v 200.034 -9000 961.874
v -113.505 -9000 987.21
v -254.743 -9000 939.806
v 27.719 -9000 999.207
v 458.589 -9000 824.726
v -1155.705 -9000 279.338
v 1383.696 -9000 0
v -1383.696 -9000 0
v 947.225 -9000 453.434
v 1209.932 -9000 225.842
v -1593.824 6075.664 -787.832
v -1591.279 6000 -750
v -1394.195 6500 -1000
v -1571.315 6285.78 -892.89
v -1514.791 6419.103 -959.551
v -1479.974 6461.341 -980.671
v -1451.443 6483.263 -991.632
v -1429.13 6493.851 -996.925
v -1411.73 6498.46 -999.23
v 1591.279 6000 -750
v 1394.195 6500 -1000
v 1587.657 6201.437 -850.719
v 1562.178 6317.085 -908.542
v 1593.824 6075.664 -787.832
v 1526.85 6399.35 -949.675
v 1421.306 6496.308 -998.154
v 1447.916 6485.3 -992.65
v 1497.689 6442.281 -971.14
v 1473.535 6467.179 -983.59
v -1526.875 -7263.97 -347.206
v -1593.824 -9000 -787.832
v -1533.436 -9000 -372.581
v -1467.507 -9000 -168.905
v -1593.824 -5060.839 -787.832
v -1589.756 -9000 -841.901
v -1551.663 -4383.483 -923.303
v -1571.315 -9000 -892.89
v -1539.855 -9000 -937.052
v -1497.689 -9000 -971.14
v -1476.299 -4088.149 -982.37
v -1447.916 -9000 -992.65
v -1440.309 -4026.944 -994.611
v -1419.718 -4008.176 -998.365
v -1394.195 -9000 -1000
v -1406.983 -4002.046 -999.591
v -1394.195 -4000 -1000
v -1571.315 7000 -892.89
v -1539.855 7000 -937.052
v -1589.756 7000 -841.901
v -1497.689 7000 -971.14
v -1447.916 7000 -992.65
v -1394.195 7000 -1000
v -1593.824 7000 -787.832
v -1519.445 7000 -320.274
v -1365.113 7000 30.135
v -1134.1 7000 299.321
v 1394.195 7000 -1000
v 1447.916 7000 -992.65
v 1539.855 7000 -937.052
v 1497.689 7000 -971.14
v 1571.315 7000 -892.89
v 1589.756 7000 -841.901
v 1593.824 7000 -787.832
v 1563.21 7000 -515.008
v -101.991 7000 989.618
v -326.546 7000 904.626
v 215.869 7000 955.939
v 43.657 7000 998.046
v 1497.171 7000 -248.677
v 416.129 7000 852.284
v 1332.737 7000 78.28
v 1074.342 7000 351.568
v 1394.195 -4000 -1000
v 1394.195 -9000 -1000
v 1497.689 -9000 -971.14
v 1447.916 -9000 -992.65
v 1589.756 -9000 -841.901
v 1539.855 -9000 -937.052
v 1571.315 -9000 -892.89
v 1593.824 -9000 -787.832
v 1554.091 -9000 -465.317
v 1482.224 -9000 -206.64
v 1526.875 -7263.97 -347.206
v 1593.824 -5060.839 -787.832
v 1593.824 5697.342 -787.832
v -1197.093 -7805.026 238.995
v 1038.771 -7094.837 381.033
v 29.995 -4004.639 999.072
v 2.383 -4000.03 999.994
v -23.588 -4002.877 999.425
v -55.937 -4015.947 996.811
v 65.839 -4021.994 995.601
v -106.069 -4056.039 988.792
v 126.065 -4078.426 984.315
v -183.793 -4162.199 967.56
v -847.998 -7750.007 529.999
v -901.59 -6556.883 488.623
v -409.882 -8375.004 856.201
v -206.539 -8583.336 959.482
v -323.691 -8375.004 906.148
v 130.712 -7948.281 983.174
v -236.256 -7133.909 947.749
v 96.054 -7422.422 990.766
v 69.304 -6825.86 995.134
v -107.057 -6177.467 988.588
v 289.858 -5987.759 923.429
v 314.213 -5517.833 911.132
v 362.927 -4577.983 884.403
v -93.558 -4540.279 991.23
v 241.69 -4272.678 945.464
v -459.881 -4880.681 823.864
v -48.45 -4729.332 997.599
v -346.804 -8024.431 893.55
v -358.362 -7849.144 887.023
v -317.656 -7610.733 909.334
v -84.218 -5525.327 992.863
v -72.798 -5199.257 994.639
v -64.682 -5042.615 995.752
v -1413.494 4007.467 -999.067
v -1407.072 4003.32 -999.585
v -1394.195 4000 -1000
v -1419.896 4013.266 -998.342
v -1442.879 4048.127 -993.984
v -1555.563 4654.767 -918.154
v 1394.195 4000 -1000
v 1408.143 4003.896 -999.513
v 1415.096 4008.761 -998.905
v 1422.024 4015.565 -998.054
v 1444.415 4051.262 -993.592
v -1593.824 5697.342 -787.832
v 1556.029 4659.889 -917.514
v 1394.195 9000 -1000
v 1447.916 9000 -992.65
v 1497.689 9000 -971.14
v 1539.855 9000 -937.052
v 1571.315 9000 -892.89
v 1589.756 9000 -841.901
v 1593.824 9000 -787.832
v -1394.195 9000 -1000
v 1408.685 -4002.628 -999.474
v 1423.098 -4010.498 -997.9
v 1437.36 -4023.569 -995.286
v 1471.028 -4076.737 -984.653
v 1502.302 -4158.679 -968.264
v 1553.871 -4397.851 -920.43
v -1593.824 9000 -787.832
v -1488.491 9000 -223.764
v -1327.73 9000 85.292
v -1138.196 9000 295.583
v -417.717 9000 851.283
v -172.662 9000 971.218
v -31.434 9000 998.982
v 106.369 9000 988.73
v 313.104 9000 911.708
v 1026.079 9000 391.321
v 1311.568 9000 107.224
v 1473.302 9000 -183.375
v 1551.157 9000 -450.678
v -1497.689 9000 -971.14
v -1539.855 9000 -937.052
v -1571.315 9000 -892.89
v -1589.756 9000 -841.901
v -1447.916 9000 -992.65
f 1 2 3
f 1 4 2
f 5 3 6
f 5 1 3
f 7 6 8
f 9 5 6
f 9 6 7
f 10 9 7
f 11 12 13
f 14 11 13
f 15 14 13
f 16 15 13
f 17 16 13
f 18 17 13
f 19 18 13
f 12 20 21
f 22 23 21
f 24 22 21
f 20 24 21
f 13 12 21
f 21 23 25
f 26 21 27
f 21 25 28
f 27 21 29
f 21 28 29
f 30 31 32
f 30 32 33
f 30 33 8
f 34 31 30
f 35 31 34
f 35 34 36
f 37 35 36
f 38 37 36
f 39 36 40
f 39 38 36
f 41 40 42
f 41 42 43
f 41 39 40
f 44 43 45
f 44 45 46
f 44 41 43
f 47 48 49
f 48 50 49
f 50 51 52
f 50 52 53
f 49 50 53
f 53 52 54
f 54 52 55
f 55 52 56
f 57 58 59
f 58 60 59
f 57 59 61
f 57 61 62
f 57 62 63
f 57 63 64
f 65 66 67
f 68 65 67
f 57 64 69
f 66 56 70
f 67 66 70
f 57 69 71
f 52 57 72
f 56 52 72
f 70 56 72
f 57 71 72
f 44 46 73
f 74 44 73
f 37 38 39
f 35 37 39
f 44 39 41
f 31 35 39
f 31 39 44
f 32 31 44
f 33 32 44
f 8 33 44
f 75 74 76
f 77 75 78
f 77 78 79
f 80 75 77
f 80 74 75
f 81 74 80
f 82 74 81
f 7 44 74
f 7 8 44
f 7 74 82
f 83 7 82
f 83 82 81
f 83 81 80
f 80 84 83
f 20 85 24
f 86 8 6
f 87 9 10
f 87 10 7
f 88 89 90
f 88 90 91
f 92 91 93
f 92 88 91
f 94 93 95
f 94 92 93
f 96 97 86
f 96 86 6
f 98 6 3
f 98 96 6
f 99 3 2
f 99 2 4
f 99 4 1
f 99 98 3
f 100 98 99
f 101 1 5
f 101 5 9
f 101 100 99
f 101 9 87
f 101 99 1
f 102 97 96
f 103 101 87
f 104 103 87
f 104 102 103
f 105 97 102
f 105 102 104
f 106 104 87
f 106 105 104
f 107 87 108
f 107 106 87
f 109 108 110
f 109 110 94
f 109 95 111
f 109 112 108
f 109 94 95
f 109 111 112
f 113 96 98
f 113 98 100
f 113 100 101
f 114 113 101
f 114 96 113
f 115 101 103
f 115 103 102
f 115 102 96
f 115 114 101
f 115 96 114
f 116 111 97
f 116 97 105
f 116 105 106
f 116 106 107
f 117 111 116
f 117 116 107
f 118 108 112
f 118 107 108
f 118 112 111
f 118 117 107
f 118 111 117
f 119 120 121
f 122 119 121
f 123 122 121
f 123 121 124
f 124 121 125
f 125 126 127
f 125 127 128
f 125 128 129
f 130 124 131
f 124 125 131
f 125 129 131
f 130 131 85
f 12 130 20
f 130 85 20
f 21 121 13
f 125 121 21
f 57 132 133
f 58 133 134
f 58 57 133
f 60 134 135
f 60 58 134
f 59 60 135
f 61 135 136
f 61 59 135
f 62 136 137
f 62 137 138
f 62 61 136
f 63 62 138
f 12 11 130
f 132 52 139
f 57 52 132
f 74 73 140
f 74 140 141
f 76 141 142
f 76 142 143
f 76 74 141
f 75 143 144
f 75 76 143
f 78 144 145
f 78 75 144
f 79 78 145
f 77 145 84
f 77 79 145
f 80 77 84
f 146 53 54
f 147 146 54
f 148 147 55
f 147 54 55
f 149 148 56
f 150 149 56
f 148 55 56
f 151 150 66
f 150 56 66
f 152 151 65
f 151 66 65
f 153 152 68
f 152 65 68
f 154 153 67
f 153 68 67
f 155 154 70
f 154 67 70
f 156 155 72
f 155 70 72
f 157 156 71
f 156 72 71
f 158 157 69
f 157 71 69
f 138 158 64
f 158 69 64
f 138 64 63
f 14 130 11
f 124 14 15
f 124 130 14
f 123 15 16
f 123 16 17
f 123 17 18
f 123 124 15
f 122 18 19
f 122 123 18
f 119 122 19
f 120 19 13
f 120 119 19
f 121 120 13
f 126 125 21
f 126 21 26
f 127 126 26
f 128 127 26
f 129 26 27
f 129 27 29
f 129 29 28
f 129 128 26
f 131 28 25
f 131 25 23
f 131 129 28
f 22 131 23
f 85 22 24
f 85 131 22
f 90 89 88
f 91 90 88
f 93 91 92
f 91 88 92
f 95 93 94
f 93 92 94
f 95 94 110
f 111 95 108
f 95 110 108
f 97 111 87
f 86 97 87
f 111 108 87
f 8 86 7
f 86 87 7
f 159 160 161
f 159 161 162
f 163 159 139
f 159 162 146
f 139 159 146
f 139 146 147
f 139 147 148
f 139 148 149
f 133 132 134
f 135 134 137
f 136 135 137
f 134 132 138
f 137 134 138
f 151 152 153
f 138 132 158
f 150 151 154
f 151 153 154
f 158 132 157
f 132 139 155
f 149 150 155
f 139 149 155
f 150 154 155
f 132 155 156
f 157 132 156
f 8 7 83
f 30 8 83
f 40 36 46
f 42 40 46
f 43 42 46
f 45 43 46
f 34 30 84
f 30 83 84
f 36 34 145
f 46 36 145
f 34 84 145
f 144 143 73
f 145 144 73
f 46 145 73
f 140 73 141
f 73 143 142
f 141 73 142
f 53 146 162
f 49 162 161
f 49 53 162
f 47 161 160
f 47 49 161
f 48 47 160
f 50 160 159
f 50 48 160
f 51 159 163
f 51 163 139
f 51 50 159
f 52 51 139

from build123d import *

# Parameters (mm, degrees)
F2_DEPTH = 9000
F0_W     = 8000
F0_H     = 2000
F3_DEPTH = 2500


with BuildPart() as f2:
    # F1 (on Front) → F2 (new body, symmetric)
    with BuildSketch(Plane.XZ):
        with BuildLine():
            ThreePointArc((-1593.8242572385, -787.8322373844), (-1539.854532805, -937.0519016228), (-1394.1947364933, -1000))
            Line((-1394.1947364933, -1000), (1394.1947364933, -1000))
            ThreePointArc((1394.1947364933, -1000), (1539.854532805, -937.0519016228), (1593.8242572385, -787.8322373844))
            add(Edge.make_bspline(
                [(-1593.8242572385, -787.8322373844), (-1543.6100586497, 36.0033941567), (-911.3761259503, 443.0558884844), (0, 1250.1154223925), (911.3761259503, 443.0558884844), (1543.6100586497, 36.0033941567), (1593.8242572385, -787.8322373844)],
                knots=[0.0213435754, 0.0213435754, 0.0213435754, 0.0213435754, 0.2850424282, 0.5, 0.7149575718, 0.9786564246, 0.9786564246, 0.9786564246, 0.9786564246], degree=3))
        make_face()
    extrude(amount=F2_DEPTH, both=True)

    # F0 (on Right) → F3 (cut, symmetric)
    with BuildSketch(Plane.YZ):
        Rectangle(F0_W, F0_H)
        Polygon((-4000, -1000), (-4000, 1000), (-9000, 0), align=None)
        Polygon((6000, 1000), (4000, 1000), (4000, -1000), (6000, -750), align=None)
        Polygon((7000, 1000), (6000, 1000), (6000, -750), (7000, -1250), align=None)
    extrude(amount=F3_DEPTH, both=True, mode=Mode.SUBTRACT)


solid = f2.part
